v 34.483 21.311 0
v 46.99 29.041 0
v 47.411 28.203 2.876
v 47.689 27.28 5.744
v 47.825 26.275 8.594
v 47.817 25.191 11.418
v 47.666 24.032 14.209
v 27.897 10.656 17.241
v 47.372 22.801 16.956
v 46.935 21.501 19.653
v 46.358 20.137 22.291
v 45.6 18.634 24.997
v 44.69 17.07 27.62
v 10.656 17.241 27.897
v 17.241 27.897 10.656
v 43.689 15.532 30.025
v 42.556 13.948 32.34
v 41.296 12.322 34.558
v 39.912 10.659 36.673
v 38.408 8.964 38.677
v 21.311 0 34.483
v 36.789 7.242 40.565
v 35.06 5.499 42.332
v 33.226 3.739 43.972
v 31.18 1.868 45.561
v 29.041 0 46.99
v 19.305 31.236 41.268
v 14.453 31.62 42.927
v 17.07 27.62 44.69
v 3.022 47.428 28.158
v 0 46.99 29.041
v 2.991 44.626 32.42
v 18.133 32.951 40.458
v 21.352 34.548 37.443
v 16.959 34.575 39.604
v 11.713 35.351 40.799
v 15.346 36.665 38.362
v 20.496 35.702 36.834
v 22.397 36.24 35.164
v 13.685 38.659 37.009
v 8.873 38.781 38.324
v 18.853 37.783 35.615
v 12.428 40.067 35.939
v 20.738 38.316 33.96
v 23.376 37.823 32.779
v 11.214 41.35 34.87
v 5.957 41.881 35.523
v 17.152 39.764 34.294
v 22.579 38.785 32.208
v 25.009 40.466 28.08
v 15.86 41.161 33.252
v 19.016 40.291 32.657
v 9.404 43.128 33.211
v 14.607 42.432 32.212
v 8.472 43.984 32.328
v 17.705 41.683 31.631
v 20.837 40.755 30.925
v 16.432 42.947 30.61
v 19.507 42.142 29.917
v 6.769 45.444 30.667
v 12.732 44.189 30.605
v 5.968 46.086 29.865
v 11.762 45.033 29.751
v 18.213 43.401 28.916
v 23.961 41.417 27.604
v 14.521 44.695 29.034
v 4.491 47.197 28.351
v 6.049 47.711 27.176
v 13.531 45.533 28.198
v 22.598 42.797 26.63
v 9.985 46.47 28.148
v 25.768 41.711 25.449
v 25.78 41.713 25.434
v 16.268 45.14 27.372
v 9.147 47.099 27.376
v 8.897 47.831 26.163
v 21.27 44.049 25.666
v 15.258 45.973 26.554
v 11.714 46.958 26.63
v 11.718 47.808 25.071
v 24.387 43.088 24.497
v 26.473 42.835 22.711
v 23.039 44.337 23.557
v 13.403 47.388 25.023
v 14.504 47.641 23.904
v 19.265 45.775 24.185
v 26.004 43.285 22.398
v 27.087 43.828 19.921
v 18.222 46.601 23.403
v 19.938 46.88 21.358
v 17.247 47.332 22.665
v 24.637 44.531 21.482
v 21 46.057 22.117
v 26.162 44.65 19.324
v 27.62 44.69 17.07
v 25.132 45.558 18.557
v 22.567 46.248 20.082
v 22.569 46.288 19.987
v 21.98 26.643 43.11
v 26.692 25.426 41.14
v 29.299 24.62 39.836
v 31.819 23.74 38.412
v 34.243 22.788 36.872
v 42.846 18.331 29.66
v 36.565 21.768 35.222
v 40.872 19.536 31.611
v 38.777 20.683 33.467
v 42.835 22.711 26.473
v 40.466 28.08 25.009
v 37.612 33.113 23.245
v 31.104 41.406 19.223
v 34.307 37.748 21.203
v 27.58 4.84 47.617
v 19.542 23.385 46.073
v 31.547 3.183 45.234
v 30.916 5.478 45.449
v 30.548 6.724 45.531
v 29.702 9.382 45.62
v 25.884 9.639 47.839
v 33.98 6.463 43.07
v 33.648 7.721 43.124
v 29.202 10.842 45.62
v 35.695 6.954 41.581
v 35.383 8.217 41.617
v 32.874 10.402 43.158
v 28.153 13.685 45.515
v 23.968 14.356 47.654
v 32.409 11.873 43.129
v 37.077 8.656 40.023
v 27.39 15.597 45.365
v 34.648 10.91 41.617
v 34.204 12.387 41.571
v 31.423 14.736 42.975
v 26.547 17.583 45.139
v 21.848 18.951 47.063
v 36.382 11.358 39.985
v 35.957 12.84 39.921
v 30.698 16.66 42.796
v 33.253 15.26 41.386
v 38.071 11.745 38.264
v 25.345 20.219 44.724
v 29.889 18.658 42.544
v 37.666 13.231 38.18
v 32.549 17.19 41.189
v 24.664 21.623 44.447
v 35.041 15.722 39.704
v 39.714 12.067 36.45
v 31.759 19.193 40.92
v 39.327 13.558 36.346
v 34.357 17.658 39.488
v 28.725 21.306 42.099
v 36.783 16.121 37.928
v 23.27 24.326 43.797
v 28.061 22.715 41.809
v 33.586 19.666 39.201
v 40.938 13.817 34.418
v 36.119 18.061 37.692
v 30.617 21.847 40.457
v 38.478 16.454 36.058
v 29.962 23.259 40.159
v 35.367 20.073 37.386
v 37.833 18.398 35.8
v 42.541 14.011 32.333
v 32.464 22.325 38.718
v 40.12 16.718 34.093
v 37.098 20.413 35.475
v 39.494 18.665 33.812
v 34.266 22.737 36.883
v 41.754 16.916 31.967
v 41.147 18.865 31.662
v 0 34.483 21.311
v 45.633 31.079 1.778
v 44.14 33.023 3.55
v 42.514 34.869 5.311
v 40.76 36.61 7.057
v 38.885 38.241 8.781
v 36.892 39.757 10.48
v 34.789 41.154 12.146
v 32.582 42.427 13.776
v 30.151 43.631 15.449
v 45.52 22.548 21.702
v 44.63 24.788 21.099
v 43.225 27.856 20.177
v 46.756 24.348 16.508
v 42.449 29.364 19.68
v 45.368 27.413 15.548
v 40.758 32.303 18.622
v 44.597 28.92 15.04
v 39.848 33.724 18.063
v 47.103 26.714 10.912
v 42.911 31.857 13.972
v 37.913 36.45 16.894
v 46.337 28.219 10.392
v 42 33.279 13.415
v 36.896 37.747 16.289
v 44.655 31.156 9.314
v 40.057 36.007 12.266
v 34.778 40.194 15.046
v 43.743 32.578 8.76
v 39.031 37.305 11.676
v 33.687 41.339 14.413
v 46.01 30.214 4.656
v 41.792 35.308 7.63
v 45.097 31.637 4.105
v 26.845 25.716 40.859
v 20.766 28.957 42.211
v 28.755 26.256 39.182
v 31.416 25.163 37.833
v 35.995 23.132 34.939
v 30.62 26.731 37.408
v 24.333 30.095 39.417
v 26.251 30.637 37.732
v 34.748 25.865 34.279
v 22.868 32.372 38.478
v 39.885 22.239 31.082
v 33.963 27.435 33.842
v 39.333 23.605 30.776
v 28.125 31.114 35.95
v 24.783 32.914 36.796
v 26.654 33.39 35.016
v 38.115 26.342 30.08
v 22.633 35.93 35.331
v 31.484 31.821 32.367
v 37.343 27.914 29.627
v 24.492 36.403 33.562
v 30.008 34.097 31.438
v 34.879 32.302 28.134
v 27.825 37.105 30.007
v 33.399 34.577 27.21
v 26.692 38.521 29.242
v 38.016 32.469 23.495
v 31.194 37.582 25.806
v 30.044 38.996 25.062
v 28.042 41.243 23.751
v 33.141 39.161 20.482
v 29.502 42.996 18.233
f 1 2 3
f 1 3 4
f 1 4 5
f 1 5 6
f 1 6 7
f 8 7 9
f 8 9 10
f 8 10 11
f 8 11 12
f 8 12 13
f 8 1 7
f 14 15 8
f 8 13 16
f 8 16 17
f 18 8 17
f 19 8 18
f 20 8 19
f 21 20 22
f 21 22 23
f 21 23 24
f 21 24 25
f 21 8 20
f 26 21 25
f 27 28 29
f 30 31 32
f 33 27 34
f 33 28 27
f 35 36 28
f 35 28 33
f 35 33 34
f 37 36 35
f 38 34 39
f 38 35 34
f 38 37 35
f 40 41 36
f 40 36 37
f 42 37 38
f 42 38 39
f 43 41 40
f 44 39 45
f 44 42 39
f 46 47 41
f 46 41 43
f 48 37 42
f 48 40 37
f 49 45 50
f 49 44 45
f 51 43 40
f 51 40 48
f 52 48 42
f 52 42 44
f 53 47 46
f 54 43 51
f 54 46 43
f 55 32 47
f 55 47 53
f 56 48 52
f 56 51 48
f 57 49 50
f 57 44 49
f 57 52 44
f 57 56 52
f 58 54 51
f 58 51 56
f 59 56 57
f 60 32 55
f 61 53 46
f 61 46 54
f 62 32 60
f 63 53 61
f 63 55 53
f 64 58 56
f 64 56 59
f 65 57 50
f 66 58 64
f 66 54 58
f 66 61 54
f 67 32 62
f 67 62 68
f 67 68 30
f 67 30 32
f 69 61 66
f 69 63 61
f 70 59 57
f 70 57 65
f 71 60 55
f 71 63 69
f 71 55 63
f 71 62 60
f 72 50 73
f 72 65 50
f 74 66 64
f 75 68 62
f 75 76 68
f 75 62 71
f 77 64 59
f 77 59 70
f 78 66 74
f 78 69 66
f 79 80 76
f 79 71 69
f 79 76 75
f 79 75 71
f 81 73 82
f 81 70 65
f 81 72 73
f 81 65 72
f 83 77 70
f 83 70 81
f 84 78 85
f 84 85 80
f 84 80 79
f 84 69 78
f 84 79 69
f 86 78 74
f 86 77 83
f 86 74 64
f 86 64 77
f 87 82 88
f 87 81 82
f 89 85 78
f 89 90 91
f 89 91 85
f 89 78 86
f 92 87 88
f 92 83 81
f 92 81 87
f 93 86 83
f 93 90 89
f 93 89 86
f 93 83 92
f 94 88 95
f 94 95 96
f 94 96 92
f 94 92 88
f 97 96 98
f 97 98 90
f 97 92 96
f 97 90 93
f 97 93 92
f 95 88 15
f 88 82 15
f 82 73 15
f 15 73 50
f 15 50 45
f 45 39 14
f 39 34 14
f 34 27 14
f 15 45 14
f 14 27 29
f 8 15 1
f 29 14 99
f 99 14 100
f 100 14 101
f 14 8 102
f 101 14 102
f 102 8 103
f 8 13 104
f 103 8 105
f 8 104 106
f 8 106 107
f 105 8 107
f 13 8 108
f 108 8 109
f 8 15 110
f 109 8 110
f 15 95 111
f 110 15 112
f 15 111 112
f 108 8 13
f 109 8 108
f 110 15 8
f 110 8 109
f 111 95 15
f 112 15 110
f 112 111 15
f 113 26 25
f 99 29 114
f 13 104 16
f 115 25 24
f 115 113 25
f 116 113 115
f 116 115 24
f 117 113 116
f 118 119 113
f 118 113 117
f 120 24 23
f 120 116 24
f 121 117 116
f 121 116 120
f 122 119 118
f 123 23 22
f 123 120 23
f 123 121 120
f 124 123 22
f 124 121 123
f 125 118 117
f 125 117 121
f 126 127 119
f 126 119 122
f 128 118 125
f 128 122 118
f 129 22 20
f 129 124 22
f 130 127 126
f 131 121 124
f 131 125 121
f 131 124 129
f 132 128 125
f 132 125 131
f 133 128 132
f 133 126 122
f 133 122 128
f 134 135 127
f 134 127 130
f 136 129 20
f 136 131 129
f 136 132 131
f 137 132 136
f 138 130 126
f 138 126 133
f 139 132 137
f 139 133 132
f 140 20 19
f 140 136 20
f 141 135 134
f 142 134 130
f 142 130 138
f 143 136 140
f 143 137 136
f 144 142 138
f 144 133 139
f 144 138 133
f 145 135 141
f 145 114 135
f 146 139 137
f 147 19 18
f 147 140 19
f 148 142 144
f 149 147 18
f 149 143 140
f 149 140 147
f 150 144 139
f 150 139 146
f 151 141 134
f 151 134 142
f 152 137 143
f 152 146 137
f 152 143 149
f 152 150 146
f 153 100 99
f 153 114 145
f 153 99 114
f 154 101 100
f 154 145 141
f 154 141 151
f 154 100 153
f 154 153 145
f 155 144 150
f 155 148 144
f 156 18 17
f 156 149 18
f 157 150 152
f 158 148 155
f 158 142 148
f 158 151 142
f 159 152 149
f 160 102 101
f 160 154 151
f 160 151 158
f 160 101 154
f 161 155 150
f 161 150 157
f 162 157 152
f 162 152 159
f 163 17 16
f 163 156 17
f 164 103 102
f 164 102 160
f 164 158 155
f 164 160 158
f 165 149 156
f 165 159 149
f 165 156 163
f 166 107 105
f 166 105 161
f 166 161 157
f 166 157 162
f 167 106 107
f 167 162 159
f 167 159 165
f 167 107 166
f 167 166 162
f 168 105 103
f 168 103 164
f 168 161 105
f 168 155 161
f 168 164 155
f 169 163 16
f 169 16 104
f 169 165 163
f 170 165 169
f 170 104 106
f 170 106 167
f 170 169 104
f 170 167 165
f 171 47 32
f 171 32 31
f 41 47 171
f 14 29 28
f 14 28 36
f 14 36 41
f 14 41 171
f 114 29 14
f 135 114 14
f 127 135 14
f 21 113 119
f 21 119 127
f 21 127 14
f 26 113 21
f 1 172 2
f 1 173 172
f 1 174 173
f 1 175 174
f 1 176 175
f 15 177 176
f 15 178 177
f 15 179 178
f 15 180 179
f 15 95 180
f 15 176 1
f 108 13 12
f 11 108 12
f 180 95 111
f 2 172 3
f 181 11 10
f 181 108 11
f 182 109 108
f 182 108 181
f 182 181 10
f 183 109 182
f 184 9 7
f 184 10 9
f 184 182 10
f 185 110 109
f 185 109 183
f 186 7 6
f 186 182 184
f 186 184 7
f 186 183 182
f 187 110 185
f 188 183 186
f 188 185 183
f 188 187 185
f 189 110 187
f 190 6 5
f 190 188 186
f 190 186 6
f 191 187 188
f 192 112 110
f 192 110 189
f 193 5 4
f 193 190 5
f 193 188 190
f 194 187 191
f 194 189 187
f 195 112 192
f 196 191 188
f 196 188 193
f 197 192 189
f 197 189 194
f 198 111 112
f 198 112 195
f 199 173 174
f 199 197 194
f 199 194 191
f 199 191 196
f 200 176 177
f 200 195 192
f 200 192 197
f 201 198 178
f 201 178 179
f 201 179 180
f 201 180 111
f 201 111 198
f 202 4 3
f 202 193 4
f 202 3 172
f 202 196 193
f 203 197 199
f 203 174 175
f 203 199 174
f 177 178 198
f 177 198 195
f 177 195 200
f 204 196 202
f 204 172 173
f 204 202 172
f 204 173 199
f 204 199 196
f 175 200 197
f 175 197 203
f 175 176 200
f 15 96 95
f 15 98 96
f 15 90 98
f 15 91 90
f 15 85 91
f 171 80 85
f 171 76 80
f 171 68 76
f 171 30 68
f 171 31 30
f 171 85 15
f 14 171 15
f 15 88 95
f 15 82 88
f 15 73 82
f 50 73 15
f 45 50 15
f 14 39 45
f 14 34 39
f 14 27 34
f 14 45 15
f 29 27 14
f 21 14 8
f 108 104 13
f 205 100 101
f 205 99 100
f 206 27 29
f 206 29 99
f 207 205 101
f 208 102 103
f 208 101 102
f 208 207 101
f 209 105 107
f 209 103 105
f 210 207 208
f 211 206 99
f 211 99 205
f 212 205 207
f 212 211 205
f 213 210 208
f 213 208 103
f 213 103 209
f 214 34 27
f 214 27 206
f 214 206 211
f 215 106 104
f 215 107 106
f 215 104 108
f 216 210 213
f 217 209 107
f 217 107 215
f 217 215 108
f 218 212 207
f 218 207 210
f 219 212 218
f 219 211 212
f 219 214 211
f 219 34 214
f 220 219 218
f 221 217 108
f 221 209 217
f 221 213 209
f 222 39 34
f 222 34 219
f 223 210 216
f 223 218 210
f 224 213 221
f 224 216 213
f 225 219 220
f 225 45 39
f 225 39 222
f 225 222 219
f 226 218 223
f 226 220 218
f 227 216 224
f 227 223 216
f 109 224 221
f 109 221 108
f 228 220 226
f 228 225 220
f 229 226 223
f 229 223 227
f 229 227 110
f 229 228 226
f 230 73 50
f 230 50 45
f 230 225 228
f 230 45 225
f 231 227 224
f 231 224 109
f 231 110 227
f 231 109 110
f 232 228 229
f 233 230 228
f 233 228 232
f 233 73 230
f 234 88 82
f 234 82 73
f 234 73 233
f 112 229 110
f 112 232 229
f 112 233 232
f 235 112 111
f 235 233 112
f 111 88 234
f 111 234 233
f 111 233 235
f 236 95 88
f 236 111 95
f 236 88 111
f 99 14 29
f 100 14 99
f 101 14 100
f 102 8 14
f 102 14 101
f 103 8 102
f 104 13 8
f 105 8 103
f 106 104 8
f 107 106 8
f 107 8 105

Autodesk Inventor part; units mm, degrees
sketch "Sketch1" plane through (0, 0, 0) normal (0, 0, 1) x (1, 0, 0)
  line L0 (-46.99, -29.0414) -> (46.99, -29.0414)
  line L1 (46.99, -29.0414) -> (46.99, 29.0414)
  line L2 (46.99, 29.0414) -> (-46.99, 29.0414)
  line L3 (-46.99, 29.0414) -> (-46.99, -29.0414)
  point P0 (0, 0)
  dimension "d3" = 46.99
  dimension "d4" = 46.99
  dimension "d5" = 29.0414
  dimension "d6" = 29.0414
sketch "Sketch4" plane through (0, 0, 0) normal (1, 0, 0) x (0, 1, 0)
  line L0 (-47.0942, 0) -> (47.0942, 0)
  line L1 (-46.99, -29.0414) -> (46.99, -29.0414)
  line L2 (46.99, -29.0414) -> (46.99, 29.0414)
  line L3 (46.99, 29.0414) -> (-46.99, 29.0414)
  line L4 (-46.99, 29.0414) -> (-46.99, -29.0414)
  point P0 (0, 0)
  point P1 (0, 0)
  dimension "d38" = 29.0414
  dimension "d39" = 29.0414
  dimension "d40" = 46.99
  dimension "d41" = 46.99
sketch "Sketch5" plane through (0, 0, 0) normal (0, 1, 0) x (-1, 0, 0)
  line L0 (-29.0414, -46.99) -> (29.0414, -46.99)
  line L1 (29.0414, -46.99) -> (29.0414, 46.99)
  line L2 (29.0414, 46.99) -> (-29.0414, 46.99)
  line L3 (-29.0414, 46.99) -> (-29.0414, -46.99)
  point P0 (0, 0)
  point P1 (0, 0)
  point P2 (0, 0)
  dimension "d31" = 29.0414
  dimension "d32" = 29.0414
  dimension "d33" = 46.99
  dimension "d34" = 46.99
sketch3d "3D Sketch1"
ref_plane "Work Plane1" through (0, 46.99, 29.0414) normal (-0.5773503, -0.5773503, -0.5773503) x (0.809017, -0.309017, -0.5)
sketch "Sketch6" plane through (0, 46.99, 29.0414) normal (-0.5773503, -0.5773503, -0.5773503) x (0.809017, -0.309017, -0.5)
  line L0 (0, 0) -> (29.0414, 50.3012) projected
  line L1 (0, 0) -> (58.0828, 0) projected
  line L2 (29.0414, 50.3012) -> (58.0828, 0) projected
  line L3 (14.5207, 25.1506) -> (29.0414, 0)
  line L4 (29.0414, 0) -> (43.5621, 25.1506)
  line L5 (14.5207, 25.1506) -> (43.5621, 25.1506)
  circle A0 centre (29.0414, 16.7671) radius 12.7
  dimension "d48" = 25.4
sketch3d "3D Sketch2"
ref_plane "Work Plane2" through (-6.7458, 40.2442, 22.2957) normal (-0.5773503, -0.5773503, -0.5773503) x (0.809017, -0.309017, -0.5)
sketch "Sketch8" plane through (-6.7458, 40.2442, 22.2957) normal (-0.5773503, -0.5773503, -0.5773503) x (0.809017, -0.309017, -0.5)
  line L0 (18.3857, 22.9192) -> (39.6971, 22.9192)
  line L1 (39.6971, 22.9192) -> (29.0414, 4.4629)
  line L2 (29.0414, 4.4629) -> (18.3857, 22.9192)
  line L3 (29.0414, 4.4629) -> (50.3529, 4.4629)
  line L4 (39.6971, 22.9192) -> (50.3529, 4.4629)
  line L5 (7.73, 4.4629) -> (18.3857, 22.9192)
  line L6 (7.73, 4.4629) -> (29.0414, 4.4629)
  line L7 (39.6971, 22.9192) -> (29.0414, 41.3754)
  line L8 (18.3857, 22.9192) -> (29.0414, 41.3754)
  point P0 (29.0414, 16.7671)
ref_plane "Work Plane4" through (0, 46.99, 29.0414) normal (-0.809017, -0.309017, 0.5) x (0, -0.8506508, -0.5257311)
sketch "Sketch9" plane through (0, 46.99, 29.0414) normal (-0.809017, -0.309017, 0.5) x (0, -0.8506508, -0.5257311)
  line L0 (0, 0) -> (55.2401, 0) projected
  line L1 (55.2401, 0) -> (30.536, 49.4082) projected
  line L2 (0, 0) -> (14.7032, 0)
  line L3 (30.536, 49.4082) -> (37.1114, 36.2572)
  line L4 (55.2401, 0) -> (79.9442, 39.9721) construction
  arc A0 (30.536, 49.4082) -> (0, 0) centre (55.2401, 0) ccw
  dimension "d43" = 46.99
ref_plane "Work Plane7" through (0, 46.99, 29.0414) normal (-0.309017, 0.5, -0.809017) x (0.809017, -0.309017, -0.5)
ref_plane "Work Plane9" through (46.99, 29.0414, 0) normal (-0.1624598, 0.2628656, 0.9510565) x (-0.8506508, -0.5257311, 0)
revolve "Revolution2" add sketch "Sketch9" angle 58.283 about axis through (0, 0, 0) along (-0.5, 0.809017, -0.309017)
ref_plane "Work Plane10" through (0, 0, 0) normal (0.5, -0.809017, -0.309017) x (0.8506508, 0.5257311, 0)
ref_plane "Work Plane11" through (0, 46.99, 29.0414) normal (-0.309017, 0.5, -0.809017) x (0.809017, -0.309017, -0.5)
split "Split4" plane through (0, 0, 0) removes the side toward (0.5, -0.809017, -0.309017)
split "Split5" plane through (0, 46.99, 29.0414) removes the side toward (-0.309017, 0.5, -0.809017)
ref_plane "Work Plane13" through (18.7929, 30.4076, 49.2006) normal (0, 0.8506508, -0.5257311) x (0.809017, -0.309017, -0.5)
ref_plane "Work Plane14" through (49.2006, 18.7929, 30.4076) normal (-0.5257311, 0, 0.8506508) x (-0.5, 0.809017, -0.309017)
ref_plane "Work Plane15" through (0, 0, 0) normal (-0.8506508, 0.5257311, 0) x (0.309017, 0.5, 0.809017)
split body "Split7" result two bodies by plane through (0, 0, 0) normal (-0.8506508, 0.5257311, 0) first body at (17.4067, 29.1157, 14.0495)
split body "Split8" result two bodies by plane through (49.2006, 18.7929, 30.4076) normal (-0.5257311, 0, 0.8506508) bodies 3 first body at (26.8909, 19.1826, 16.0317)
split body "Split9" result two bodies by plane through (18.7929, 30.4076, 49.2006) normal (0, 0.8506508, -0.5257311) bodies 5 first body at (26.3652, 19.1826, 16.8824)
shell "Shell1" [suppressed]
shell "Shell2" [suppressed]
split "Split10" plane through (-6.7458, 40.2442, 22.2957) removes the side toward (-0.5773503, -0.5773503, -0.5773503)
split "Split11" plane through (-6.7458, 40.2442, 22.2957) removes the side toward (-0.5773503, -0.5773503, -0.5773503)
split "Split12" plane through (-6.7458, 40.2442, 22.2957) removes the side toward (-0.5773503, -0.5773503, -0.5773503)
split "Split13" plane through (-6.7458, 40.2442, 22.2957) removes the side toward (-0.5773503, -0.5773503, -0.5773503)
ref_plane "Work Plane16" through (29.0414, 0, 46.99) normal (0.5773503, 0.5773503, 0.5773503) x (0.309017, 0.5, -0.809017)
sketch "Sketch17" plane through (29.0414, 0, 46.99) normal (0.5773503, 0.5773503, 0.5773503) x (0.309017, 0.5, -0.809017)
  point P0 (29.0414, 16.7671)
equation "\"d3\" = radius"
equation "\"d4\" = radius"
equation "\"d40\" = radius"
equation "\"d41\" = radius"
equation "\"d33\" = radius"
equation "\"d34\" = radius"
equation "\"d43\" = radius"
equation "\"d46\" = wall_thick"
equation "\"d47\" = wall_thick"
equation "\"radius\" = 46.99"
equation "\"inset\" = 11.684"
equation "\"gratio\" = 1.618034"
equation "\"d11\" = radius"
equation "\"d12\" = gratio"
equation "\"d17\" = radius"
equation "\"d18\" = gratio"
equation "\"d23\" = radius"
equation "\"d24\" = gratio"
equation "\"d29\" = radius"
equation "\"d30\" = gratio"
equation "\"d35\" = radius"
equation "\"d36\" = gratio"
equation "\"d37\" = inset"
equation "\"wall_thick\" = 1.27"
properties part number "ommatid"
